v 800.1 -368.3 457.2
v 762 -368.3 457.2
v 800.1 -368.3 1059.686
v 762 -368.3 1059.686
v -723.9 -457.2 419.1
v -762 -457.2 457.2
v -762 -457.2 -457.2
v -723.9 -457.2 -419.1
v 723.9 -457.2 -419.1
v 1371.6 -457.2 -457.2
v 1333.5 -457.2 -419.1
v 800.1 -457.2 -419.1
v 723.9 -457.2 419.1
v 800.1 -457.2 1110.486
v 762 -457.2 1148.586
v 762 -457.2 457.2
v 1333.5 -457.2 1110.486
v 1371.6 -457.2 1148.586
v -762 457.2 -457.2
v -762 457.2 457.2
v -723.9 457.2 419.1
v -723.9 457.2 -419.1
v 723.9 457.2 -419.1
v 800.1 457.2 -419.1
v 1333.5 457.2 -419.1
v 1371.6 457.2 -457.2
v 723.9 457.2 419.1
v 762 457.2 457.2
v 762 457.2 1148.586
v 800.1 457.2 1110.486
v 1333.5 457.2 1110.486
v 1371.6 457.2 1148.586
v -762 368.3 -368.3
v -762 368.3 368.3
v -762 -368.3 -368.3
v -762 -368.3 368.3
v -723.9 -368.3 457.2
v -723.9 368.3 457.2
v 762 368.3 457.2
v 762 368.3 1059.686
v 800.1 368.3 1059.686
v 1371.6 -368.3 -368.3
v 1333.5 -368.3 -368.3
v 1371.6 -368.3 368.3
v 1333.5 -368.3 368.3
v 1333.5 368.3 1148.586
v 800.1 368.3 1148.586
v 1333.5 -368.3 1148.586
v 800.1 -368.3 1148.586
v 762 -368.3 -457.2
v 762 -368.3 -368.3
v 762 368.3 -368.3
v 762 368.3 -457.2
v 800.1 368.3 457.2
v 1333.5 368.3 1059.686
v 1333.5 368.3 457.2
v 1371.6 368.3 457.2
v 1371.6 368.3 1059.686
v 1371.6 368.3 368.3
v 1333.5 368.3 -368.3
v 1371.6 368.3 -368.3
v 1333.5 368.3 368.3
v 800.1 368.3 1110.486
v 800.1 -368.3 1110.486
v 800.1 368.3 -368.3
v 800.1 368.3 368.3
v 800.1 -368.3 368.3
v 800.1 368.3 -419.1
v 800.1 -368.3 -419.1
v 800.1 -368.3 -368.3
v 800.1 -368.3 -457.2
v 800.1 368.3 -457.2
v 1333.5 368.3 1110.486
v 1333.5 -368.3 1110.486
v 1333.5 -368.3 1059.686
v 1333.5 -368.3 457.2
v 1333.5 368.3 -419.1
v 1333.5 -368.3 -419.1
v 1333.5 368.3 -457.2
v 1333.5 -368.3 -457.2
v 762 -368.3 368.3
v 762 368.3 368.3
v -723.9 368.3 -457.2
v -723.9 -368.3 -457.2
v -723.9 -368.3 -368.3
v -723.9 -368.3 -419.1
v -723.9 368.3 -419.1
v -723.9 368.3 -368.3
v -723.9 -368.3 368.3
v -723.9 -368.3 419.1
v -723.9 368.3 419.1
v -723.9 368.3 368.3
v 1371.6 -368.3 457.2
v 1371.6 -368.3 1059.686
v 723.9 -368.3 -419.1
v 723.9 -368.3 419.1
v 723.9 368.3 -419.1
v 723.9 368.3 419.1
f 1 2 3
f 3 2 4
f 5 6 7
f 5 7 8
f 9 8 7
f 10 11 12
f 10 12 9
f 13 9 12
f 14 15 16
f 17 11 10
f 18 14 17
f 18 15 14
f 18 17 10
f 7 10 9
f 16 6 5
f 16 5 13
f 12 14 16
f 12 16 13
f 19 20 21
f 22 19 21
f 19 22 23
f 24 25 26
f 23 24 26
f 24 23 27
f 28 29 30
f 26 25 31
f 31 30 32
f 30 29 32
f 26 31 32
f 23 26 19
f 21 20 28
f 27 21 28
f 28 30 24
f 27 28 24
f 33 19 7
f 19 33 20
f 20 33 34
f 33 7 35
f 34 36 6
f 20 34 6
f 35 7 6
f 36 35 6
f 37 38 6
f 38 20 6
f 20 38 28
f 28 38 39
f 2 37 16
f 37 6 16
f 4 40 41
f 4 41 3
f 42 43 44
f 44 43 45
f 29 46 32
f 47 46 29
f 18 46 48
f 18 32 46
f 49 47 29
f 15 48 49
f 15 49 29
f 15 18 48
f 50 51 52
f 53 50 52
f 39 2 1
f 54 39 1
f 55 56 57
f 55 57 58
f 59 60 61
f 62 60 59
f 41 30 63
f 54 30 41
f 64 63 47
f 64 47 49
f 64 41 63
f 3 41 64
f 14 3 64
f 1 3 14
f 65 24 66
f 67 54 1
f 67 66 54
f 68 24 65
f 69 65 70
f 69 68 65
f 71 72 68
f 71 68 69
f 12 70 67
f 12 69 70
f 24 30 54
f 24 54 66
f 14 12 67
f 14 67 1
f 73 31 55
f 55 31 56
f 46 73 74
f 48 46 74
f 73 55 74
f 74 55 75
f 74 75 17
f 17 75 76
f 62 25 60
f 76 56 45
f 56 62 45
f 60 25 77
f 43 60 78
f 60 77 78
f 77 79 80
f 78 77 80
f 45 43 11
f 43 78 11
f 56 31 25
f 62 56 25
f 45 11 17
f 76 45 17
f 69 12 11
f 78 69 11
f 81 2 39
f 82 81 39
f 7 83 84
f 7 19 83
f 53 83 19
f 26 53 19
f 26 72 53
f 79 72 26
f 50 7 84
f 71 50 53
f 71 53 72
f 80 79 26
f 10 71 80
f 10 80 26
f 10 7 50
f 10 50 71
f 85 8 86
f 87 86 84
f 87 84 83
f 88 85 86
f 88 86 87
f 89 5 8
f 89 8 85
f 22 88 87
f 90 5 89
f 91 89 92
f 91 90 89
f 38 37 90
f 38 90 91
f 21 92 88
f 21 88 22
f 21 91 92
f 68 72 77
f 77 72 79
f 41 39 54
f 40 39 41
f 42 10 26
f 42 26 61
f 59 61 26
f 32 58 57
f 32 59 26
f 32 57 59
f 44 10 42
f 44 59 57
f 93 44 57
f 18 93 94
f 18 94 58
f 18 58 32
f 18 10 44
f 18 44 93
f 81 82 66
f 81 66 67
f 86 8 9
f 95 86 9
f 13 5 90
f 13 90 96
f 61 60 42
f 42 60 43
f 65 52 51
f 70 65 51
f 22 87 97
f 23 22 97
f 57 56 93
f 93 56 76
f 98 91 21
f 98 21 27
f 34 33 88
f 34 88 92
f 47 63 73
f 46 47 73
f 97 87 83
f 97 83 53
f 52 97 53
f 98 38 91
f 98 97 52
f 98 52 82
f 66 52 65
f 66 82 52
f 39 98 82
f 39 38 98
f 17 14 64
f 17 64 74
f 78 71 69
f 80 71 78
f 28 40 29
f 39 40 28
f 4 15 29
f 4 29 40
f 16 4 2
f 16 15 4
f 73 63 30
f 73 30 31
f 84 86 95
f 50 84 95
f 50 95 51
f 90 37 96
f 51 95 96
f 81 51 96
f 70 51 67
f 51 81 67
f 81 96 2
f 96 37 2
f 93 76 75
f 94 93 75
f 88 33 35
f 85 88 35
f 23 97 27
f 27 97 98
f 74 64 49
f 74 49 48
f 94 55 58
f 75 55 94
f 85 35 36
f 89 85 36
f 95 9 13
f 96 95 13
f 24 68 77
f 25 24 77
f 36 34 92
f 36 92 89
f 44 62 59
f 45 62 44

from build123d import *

# Parameters (mm, degrees)
F0_W      = 1524
F0_H      = 914.4
F1_DEPTH  = 457.2
F2_W      = 736.6
F2_H      = 736.6
F3_DEPTH  = 2133.6
F4_W      = 1447.8
F4_H      = 838.2
F4_W_2    = 533.4
F4_H_2    = 1529.586154
F5_DEPTH  = 914.4
F6_W      = 736.6
F6_H      = 602.486154
F7_DEPTH  = 609.6
F8_W      = 1485.9
F8_H      = 736.6
F9_DEPTH  = 914.4
F10_DEPTH = 914.4
F11_W     = 533.4
F11_H     = 736.6
F12_DEPTH = 1605.786154


with BuildPart() as f1:
    # F0 (on Front) → F1 (new body, symmetric)
    with BuildSketch(Plane.XZ):
        Rectangle(F0_W, F0_H)
        Polygon((762, 1148.586154), (762, 457.2), (762, -457.2), (1371.6, -457.2), (1371.6, 1148.586154), align=None)
    extrude(amount=F1_DEPTH, both=True)

    # F2 (on face) → F3 (cut, through all)
    with BuildSketch(Plane(origin=(-762, 0, 0), x_dir=(0, -1, 0), z_dir=(-1, 0, 0))):
        Rectangle(F2_W, F2_H)
    extrude(amount=-F3_DEPTH, mode=Mode.SUBTRACT)

    # F4 (on face) → F5 (cut, through all)
    with BuildSketch(Plane.XZ.offset(457.2)):
        Rectangle(F4_W, F4_H)
        with Locations((1066.8, 345.693077)):
            Rectangle(F4_W_2, F4_H_2)
    extrude(amount=-F5_DEPTH, mode=Mode.SUBTRACT)

    # F6 (on face) → F7 (cut, through all)
    with BuildSketch(Plane(origin=(762, 0, 0), x_dir=(0, -1, 0), z_dir=(-1, 0, 0))):
        with Locations((0, 758.443077)):
            Rectangle(F6_W, F6_H)
    extrude(amount=-F7_DEPTH, mode=Mode.SUBTRACT)

    # F8 (on face) → F9 (cut, through all)
    with BuildSketch(Plane.XY.offset(457.2)):
        with Locations((19.05, 0)):
            Rectangle(F8_W, F8_H)
    extrude(amount=-F9_DEPTH, mode=Mode.SUBTRACT)

    # F8 (on face) → F10 (cut, through all)
    with BuildSketch(Plane.XY.offset(457.2)):
        with Locations((19.05, 0)):
            Rectangle(F8_W, F8_H)
    extrude(amount=-F10_DEPTH, mode=Mode.SUBTRACT)

    # F11 (on face) → F12 (cut, through all)
    with BuildSketch(Plane(origin=(0, 0, -457.2), x_dir=(1, 0, 0), z_dir=(0, 0, -1))):
        with Locations((1066.8, 0)):
            Rectangle(F11_W, F11_H)
    extrude(amount=-F12_DEPTH, mode=Mode.SUBTRACT)


solid = f1.part
